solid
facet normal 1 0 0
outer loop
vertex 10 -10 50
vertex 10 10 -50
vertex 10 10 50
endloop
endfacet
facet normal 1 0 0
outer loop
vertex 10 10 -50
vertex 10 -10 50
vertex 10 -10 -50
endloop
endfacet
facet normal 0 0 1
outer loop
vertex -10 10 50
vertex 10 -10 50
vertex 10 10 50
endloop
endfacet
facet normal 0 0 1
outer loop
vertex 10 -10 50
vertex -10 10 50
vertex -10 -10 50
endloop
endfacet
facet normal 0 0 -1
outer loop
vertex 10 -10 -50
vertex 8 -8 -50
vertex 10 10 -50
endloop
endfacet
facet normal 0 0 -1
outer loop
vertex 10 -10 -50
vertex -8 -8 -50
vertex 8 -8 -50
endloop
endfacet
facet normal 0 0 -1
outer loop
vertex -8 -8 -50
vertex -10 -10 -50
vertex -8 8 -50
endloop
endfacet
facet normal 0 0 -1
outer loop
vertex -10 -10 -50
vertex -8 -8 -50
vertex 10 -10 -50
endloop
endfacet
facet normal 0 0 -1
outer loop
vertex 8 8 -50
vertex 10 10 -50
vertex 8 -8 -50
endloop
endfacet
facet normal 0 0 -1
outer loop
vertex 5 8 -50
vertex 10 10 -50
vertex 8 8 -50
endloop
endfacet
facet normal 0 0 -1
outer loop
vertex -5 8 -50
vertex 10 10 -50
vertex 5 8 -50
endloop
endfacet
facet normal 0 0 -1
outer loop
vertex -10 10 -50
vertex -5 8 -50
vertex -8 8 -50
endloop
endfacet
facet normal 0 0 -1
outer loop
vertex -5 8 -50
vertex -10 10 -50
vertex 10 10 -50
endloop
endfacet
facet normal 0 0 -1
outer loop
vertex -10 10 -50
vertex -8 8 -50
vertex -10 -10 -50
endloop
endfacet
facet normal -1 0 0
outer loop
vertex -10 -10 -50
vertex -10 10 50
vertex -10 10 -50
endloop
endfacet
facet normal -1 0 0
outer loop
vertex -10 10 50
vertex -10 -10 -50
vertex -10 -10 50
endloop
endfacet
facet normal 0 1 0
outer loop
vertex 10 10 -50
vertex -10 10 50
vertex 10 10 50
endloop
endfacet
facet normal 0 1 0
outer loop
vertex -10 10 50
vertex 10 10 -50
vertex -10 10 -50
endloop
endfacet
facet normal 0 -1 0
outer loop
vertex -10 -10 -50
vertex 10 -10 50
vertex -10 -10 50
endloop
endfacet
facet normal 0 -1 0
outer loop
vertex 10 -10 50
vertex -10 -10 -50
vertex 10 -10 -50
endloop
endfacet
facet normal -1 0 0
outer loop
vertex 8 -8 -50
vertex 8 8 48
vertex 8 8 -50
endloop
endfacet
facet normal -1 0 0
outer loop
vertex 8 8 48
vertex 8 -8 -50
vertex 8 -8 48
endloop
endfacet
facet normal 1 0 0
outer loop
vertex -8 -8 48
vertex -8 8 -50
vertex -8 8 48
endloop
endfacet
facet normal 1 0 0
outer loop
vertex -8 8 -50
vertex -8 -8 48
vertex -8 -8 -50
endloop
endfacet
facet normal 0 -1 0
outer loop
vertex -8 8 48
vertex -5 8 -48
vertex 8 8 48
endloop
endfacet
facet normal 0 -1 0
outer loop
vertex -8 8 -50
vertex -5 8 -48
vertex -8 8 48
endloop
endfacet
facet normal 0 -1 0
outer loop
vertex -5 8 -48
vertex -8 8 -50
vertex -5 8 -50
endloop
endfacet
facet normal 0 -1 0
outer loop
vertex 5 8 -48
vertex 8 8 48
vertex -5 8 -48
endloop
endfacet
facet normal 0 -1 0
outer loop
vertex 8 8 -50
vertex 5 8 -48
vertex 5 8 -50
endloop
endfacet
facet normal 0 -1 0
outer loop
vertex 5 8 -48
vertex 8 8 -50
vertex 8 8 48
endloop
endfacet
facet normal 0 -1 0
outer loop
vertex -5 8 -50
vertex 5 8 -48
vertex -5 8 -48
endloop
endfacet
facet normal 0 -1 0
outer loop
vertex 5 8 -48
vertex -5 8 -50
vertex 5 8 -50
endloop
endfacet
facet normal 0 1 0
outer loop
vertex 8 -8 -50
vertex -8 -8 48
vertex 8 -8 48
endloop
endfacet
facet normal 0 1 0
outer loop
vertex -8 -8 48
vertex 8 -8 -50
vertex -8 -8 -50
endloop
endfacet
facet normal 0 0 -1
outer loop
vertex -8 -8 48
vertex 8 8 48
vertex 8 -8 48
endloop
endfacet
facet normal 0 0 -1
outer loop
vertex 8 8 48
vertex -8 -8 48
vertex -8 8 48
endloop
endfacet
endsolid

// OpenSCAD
// Parameters
outer_width = 20; //[10:40:1]
outer_height = 20; //[10:40:1]
wall_thickness = 2; //[1:6:0.5]
length = 100; //[20:400:1]
center = 1; //[0:1:1]
corner_fillet_radius = 0; //[0:3:0.5]
overlap = 1; //[0.5:2:0.5]

// Box Section - Primary Component
module box_section() {
  color("Silver") {
    difference() {
      cube([outer_width, outer_height, length], center=true);
      translate([0, 0, 0])
        cube([outer_width - 2*wall_thickness, outer_height - 2*wall_thickness, length + 2*overlap], center=true);
    }
  }
}

// Box Corner Profile Section - Secondary Component
module box_corner_profile_section() {
  color("DimGray") {
    translate([outer_width/2 - wall_thickness/2, outer_height/2 - wall_thickness/2, 0])
      cube([wall_thickness, wall_thickness, length], center=true);
  }
}

// Box Bezel Section - Secondary Component
module box_bezel_section() {
  color("DimGray") {
    translate([0, 0, length/2 - wall_thickness/2])
      cube([outer_width, outer_height, wall_thickness], center=true);
  }
}

// Box Corner Profile Sections - Secondary Component
module box_corner_profile_sections() {
  color("DimGray") {
    translate([-outer_width/2 + wall_thickness/2, -outer_height/2 + wall_thickness/2, 0])
      cube([wall_thickness, wall_thickness, length], center=true);
  }
}

// Box Shelf Bracket Section - Secondary Component
module box_shelf_bracket_section() {
  color("Silver") {
    translate([0, outer_height/2 - wall_thickness/2, -length/2 + wall_thickness/2])
      cube([outer_width/2, wall_thickness, wall_thickness], center=true);
  }
}

// Assembly
module assembly() {
  box_section();
  box_corner_profile_section();
  box_bezel_section();
  box_corner_profile_sections();
  box_shelf_bracket_section();
}

assembly();
